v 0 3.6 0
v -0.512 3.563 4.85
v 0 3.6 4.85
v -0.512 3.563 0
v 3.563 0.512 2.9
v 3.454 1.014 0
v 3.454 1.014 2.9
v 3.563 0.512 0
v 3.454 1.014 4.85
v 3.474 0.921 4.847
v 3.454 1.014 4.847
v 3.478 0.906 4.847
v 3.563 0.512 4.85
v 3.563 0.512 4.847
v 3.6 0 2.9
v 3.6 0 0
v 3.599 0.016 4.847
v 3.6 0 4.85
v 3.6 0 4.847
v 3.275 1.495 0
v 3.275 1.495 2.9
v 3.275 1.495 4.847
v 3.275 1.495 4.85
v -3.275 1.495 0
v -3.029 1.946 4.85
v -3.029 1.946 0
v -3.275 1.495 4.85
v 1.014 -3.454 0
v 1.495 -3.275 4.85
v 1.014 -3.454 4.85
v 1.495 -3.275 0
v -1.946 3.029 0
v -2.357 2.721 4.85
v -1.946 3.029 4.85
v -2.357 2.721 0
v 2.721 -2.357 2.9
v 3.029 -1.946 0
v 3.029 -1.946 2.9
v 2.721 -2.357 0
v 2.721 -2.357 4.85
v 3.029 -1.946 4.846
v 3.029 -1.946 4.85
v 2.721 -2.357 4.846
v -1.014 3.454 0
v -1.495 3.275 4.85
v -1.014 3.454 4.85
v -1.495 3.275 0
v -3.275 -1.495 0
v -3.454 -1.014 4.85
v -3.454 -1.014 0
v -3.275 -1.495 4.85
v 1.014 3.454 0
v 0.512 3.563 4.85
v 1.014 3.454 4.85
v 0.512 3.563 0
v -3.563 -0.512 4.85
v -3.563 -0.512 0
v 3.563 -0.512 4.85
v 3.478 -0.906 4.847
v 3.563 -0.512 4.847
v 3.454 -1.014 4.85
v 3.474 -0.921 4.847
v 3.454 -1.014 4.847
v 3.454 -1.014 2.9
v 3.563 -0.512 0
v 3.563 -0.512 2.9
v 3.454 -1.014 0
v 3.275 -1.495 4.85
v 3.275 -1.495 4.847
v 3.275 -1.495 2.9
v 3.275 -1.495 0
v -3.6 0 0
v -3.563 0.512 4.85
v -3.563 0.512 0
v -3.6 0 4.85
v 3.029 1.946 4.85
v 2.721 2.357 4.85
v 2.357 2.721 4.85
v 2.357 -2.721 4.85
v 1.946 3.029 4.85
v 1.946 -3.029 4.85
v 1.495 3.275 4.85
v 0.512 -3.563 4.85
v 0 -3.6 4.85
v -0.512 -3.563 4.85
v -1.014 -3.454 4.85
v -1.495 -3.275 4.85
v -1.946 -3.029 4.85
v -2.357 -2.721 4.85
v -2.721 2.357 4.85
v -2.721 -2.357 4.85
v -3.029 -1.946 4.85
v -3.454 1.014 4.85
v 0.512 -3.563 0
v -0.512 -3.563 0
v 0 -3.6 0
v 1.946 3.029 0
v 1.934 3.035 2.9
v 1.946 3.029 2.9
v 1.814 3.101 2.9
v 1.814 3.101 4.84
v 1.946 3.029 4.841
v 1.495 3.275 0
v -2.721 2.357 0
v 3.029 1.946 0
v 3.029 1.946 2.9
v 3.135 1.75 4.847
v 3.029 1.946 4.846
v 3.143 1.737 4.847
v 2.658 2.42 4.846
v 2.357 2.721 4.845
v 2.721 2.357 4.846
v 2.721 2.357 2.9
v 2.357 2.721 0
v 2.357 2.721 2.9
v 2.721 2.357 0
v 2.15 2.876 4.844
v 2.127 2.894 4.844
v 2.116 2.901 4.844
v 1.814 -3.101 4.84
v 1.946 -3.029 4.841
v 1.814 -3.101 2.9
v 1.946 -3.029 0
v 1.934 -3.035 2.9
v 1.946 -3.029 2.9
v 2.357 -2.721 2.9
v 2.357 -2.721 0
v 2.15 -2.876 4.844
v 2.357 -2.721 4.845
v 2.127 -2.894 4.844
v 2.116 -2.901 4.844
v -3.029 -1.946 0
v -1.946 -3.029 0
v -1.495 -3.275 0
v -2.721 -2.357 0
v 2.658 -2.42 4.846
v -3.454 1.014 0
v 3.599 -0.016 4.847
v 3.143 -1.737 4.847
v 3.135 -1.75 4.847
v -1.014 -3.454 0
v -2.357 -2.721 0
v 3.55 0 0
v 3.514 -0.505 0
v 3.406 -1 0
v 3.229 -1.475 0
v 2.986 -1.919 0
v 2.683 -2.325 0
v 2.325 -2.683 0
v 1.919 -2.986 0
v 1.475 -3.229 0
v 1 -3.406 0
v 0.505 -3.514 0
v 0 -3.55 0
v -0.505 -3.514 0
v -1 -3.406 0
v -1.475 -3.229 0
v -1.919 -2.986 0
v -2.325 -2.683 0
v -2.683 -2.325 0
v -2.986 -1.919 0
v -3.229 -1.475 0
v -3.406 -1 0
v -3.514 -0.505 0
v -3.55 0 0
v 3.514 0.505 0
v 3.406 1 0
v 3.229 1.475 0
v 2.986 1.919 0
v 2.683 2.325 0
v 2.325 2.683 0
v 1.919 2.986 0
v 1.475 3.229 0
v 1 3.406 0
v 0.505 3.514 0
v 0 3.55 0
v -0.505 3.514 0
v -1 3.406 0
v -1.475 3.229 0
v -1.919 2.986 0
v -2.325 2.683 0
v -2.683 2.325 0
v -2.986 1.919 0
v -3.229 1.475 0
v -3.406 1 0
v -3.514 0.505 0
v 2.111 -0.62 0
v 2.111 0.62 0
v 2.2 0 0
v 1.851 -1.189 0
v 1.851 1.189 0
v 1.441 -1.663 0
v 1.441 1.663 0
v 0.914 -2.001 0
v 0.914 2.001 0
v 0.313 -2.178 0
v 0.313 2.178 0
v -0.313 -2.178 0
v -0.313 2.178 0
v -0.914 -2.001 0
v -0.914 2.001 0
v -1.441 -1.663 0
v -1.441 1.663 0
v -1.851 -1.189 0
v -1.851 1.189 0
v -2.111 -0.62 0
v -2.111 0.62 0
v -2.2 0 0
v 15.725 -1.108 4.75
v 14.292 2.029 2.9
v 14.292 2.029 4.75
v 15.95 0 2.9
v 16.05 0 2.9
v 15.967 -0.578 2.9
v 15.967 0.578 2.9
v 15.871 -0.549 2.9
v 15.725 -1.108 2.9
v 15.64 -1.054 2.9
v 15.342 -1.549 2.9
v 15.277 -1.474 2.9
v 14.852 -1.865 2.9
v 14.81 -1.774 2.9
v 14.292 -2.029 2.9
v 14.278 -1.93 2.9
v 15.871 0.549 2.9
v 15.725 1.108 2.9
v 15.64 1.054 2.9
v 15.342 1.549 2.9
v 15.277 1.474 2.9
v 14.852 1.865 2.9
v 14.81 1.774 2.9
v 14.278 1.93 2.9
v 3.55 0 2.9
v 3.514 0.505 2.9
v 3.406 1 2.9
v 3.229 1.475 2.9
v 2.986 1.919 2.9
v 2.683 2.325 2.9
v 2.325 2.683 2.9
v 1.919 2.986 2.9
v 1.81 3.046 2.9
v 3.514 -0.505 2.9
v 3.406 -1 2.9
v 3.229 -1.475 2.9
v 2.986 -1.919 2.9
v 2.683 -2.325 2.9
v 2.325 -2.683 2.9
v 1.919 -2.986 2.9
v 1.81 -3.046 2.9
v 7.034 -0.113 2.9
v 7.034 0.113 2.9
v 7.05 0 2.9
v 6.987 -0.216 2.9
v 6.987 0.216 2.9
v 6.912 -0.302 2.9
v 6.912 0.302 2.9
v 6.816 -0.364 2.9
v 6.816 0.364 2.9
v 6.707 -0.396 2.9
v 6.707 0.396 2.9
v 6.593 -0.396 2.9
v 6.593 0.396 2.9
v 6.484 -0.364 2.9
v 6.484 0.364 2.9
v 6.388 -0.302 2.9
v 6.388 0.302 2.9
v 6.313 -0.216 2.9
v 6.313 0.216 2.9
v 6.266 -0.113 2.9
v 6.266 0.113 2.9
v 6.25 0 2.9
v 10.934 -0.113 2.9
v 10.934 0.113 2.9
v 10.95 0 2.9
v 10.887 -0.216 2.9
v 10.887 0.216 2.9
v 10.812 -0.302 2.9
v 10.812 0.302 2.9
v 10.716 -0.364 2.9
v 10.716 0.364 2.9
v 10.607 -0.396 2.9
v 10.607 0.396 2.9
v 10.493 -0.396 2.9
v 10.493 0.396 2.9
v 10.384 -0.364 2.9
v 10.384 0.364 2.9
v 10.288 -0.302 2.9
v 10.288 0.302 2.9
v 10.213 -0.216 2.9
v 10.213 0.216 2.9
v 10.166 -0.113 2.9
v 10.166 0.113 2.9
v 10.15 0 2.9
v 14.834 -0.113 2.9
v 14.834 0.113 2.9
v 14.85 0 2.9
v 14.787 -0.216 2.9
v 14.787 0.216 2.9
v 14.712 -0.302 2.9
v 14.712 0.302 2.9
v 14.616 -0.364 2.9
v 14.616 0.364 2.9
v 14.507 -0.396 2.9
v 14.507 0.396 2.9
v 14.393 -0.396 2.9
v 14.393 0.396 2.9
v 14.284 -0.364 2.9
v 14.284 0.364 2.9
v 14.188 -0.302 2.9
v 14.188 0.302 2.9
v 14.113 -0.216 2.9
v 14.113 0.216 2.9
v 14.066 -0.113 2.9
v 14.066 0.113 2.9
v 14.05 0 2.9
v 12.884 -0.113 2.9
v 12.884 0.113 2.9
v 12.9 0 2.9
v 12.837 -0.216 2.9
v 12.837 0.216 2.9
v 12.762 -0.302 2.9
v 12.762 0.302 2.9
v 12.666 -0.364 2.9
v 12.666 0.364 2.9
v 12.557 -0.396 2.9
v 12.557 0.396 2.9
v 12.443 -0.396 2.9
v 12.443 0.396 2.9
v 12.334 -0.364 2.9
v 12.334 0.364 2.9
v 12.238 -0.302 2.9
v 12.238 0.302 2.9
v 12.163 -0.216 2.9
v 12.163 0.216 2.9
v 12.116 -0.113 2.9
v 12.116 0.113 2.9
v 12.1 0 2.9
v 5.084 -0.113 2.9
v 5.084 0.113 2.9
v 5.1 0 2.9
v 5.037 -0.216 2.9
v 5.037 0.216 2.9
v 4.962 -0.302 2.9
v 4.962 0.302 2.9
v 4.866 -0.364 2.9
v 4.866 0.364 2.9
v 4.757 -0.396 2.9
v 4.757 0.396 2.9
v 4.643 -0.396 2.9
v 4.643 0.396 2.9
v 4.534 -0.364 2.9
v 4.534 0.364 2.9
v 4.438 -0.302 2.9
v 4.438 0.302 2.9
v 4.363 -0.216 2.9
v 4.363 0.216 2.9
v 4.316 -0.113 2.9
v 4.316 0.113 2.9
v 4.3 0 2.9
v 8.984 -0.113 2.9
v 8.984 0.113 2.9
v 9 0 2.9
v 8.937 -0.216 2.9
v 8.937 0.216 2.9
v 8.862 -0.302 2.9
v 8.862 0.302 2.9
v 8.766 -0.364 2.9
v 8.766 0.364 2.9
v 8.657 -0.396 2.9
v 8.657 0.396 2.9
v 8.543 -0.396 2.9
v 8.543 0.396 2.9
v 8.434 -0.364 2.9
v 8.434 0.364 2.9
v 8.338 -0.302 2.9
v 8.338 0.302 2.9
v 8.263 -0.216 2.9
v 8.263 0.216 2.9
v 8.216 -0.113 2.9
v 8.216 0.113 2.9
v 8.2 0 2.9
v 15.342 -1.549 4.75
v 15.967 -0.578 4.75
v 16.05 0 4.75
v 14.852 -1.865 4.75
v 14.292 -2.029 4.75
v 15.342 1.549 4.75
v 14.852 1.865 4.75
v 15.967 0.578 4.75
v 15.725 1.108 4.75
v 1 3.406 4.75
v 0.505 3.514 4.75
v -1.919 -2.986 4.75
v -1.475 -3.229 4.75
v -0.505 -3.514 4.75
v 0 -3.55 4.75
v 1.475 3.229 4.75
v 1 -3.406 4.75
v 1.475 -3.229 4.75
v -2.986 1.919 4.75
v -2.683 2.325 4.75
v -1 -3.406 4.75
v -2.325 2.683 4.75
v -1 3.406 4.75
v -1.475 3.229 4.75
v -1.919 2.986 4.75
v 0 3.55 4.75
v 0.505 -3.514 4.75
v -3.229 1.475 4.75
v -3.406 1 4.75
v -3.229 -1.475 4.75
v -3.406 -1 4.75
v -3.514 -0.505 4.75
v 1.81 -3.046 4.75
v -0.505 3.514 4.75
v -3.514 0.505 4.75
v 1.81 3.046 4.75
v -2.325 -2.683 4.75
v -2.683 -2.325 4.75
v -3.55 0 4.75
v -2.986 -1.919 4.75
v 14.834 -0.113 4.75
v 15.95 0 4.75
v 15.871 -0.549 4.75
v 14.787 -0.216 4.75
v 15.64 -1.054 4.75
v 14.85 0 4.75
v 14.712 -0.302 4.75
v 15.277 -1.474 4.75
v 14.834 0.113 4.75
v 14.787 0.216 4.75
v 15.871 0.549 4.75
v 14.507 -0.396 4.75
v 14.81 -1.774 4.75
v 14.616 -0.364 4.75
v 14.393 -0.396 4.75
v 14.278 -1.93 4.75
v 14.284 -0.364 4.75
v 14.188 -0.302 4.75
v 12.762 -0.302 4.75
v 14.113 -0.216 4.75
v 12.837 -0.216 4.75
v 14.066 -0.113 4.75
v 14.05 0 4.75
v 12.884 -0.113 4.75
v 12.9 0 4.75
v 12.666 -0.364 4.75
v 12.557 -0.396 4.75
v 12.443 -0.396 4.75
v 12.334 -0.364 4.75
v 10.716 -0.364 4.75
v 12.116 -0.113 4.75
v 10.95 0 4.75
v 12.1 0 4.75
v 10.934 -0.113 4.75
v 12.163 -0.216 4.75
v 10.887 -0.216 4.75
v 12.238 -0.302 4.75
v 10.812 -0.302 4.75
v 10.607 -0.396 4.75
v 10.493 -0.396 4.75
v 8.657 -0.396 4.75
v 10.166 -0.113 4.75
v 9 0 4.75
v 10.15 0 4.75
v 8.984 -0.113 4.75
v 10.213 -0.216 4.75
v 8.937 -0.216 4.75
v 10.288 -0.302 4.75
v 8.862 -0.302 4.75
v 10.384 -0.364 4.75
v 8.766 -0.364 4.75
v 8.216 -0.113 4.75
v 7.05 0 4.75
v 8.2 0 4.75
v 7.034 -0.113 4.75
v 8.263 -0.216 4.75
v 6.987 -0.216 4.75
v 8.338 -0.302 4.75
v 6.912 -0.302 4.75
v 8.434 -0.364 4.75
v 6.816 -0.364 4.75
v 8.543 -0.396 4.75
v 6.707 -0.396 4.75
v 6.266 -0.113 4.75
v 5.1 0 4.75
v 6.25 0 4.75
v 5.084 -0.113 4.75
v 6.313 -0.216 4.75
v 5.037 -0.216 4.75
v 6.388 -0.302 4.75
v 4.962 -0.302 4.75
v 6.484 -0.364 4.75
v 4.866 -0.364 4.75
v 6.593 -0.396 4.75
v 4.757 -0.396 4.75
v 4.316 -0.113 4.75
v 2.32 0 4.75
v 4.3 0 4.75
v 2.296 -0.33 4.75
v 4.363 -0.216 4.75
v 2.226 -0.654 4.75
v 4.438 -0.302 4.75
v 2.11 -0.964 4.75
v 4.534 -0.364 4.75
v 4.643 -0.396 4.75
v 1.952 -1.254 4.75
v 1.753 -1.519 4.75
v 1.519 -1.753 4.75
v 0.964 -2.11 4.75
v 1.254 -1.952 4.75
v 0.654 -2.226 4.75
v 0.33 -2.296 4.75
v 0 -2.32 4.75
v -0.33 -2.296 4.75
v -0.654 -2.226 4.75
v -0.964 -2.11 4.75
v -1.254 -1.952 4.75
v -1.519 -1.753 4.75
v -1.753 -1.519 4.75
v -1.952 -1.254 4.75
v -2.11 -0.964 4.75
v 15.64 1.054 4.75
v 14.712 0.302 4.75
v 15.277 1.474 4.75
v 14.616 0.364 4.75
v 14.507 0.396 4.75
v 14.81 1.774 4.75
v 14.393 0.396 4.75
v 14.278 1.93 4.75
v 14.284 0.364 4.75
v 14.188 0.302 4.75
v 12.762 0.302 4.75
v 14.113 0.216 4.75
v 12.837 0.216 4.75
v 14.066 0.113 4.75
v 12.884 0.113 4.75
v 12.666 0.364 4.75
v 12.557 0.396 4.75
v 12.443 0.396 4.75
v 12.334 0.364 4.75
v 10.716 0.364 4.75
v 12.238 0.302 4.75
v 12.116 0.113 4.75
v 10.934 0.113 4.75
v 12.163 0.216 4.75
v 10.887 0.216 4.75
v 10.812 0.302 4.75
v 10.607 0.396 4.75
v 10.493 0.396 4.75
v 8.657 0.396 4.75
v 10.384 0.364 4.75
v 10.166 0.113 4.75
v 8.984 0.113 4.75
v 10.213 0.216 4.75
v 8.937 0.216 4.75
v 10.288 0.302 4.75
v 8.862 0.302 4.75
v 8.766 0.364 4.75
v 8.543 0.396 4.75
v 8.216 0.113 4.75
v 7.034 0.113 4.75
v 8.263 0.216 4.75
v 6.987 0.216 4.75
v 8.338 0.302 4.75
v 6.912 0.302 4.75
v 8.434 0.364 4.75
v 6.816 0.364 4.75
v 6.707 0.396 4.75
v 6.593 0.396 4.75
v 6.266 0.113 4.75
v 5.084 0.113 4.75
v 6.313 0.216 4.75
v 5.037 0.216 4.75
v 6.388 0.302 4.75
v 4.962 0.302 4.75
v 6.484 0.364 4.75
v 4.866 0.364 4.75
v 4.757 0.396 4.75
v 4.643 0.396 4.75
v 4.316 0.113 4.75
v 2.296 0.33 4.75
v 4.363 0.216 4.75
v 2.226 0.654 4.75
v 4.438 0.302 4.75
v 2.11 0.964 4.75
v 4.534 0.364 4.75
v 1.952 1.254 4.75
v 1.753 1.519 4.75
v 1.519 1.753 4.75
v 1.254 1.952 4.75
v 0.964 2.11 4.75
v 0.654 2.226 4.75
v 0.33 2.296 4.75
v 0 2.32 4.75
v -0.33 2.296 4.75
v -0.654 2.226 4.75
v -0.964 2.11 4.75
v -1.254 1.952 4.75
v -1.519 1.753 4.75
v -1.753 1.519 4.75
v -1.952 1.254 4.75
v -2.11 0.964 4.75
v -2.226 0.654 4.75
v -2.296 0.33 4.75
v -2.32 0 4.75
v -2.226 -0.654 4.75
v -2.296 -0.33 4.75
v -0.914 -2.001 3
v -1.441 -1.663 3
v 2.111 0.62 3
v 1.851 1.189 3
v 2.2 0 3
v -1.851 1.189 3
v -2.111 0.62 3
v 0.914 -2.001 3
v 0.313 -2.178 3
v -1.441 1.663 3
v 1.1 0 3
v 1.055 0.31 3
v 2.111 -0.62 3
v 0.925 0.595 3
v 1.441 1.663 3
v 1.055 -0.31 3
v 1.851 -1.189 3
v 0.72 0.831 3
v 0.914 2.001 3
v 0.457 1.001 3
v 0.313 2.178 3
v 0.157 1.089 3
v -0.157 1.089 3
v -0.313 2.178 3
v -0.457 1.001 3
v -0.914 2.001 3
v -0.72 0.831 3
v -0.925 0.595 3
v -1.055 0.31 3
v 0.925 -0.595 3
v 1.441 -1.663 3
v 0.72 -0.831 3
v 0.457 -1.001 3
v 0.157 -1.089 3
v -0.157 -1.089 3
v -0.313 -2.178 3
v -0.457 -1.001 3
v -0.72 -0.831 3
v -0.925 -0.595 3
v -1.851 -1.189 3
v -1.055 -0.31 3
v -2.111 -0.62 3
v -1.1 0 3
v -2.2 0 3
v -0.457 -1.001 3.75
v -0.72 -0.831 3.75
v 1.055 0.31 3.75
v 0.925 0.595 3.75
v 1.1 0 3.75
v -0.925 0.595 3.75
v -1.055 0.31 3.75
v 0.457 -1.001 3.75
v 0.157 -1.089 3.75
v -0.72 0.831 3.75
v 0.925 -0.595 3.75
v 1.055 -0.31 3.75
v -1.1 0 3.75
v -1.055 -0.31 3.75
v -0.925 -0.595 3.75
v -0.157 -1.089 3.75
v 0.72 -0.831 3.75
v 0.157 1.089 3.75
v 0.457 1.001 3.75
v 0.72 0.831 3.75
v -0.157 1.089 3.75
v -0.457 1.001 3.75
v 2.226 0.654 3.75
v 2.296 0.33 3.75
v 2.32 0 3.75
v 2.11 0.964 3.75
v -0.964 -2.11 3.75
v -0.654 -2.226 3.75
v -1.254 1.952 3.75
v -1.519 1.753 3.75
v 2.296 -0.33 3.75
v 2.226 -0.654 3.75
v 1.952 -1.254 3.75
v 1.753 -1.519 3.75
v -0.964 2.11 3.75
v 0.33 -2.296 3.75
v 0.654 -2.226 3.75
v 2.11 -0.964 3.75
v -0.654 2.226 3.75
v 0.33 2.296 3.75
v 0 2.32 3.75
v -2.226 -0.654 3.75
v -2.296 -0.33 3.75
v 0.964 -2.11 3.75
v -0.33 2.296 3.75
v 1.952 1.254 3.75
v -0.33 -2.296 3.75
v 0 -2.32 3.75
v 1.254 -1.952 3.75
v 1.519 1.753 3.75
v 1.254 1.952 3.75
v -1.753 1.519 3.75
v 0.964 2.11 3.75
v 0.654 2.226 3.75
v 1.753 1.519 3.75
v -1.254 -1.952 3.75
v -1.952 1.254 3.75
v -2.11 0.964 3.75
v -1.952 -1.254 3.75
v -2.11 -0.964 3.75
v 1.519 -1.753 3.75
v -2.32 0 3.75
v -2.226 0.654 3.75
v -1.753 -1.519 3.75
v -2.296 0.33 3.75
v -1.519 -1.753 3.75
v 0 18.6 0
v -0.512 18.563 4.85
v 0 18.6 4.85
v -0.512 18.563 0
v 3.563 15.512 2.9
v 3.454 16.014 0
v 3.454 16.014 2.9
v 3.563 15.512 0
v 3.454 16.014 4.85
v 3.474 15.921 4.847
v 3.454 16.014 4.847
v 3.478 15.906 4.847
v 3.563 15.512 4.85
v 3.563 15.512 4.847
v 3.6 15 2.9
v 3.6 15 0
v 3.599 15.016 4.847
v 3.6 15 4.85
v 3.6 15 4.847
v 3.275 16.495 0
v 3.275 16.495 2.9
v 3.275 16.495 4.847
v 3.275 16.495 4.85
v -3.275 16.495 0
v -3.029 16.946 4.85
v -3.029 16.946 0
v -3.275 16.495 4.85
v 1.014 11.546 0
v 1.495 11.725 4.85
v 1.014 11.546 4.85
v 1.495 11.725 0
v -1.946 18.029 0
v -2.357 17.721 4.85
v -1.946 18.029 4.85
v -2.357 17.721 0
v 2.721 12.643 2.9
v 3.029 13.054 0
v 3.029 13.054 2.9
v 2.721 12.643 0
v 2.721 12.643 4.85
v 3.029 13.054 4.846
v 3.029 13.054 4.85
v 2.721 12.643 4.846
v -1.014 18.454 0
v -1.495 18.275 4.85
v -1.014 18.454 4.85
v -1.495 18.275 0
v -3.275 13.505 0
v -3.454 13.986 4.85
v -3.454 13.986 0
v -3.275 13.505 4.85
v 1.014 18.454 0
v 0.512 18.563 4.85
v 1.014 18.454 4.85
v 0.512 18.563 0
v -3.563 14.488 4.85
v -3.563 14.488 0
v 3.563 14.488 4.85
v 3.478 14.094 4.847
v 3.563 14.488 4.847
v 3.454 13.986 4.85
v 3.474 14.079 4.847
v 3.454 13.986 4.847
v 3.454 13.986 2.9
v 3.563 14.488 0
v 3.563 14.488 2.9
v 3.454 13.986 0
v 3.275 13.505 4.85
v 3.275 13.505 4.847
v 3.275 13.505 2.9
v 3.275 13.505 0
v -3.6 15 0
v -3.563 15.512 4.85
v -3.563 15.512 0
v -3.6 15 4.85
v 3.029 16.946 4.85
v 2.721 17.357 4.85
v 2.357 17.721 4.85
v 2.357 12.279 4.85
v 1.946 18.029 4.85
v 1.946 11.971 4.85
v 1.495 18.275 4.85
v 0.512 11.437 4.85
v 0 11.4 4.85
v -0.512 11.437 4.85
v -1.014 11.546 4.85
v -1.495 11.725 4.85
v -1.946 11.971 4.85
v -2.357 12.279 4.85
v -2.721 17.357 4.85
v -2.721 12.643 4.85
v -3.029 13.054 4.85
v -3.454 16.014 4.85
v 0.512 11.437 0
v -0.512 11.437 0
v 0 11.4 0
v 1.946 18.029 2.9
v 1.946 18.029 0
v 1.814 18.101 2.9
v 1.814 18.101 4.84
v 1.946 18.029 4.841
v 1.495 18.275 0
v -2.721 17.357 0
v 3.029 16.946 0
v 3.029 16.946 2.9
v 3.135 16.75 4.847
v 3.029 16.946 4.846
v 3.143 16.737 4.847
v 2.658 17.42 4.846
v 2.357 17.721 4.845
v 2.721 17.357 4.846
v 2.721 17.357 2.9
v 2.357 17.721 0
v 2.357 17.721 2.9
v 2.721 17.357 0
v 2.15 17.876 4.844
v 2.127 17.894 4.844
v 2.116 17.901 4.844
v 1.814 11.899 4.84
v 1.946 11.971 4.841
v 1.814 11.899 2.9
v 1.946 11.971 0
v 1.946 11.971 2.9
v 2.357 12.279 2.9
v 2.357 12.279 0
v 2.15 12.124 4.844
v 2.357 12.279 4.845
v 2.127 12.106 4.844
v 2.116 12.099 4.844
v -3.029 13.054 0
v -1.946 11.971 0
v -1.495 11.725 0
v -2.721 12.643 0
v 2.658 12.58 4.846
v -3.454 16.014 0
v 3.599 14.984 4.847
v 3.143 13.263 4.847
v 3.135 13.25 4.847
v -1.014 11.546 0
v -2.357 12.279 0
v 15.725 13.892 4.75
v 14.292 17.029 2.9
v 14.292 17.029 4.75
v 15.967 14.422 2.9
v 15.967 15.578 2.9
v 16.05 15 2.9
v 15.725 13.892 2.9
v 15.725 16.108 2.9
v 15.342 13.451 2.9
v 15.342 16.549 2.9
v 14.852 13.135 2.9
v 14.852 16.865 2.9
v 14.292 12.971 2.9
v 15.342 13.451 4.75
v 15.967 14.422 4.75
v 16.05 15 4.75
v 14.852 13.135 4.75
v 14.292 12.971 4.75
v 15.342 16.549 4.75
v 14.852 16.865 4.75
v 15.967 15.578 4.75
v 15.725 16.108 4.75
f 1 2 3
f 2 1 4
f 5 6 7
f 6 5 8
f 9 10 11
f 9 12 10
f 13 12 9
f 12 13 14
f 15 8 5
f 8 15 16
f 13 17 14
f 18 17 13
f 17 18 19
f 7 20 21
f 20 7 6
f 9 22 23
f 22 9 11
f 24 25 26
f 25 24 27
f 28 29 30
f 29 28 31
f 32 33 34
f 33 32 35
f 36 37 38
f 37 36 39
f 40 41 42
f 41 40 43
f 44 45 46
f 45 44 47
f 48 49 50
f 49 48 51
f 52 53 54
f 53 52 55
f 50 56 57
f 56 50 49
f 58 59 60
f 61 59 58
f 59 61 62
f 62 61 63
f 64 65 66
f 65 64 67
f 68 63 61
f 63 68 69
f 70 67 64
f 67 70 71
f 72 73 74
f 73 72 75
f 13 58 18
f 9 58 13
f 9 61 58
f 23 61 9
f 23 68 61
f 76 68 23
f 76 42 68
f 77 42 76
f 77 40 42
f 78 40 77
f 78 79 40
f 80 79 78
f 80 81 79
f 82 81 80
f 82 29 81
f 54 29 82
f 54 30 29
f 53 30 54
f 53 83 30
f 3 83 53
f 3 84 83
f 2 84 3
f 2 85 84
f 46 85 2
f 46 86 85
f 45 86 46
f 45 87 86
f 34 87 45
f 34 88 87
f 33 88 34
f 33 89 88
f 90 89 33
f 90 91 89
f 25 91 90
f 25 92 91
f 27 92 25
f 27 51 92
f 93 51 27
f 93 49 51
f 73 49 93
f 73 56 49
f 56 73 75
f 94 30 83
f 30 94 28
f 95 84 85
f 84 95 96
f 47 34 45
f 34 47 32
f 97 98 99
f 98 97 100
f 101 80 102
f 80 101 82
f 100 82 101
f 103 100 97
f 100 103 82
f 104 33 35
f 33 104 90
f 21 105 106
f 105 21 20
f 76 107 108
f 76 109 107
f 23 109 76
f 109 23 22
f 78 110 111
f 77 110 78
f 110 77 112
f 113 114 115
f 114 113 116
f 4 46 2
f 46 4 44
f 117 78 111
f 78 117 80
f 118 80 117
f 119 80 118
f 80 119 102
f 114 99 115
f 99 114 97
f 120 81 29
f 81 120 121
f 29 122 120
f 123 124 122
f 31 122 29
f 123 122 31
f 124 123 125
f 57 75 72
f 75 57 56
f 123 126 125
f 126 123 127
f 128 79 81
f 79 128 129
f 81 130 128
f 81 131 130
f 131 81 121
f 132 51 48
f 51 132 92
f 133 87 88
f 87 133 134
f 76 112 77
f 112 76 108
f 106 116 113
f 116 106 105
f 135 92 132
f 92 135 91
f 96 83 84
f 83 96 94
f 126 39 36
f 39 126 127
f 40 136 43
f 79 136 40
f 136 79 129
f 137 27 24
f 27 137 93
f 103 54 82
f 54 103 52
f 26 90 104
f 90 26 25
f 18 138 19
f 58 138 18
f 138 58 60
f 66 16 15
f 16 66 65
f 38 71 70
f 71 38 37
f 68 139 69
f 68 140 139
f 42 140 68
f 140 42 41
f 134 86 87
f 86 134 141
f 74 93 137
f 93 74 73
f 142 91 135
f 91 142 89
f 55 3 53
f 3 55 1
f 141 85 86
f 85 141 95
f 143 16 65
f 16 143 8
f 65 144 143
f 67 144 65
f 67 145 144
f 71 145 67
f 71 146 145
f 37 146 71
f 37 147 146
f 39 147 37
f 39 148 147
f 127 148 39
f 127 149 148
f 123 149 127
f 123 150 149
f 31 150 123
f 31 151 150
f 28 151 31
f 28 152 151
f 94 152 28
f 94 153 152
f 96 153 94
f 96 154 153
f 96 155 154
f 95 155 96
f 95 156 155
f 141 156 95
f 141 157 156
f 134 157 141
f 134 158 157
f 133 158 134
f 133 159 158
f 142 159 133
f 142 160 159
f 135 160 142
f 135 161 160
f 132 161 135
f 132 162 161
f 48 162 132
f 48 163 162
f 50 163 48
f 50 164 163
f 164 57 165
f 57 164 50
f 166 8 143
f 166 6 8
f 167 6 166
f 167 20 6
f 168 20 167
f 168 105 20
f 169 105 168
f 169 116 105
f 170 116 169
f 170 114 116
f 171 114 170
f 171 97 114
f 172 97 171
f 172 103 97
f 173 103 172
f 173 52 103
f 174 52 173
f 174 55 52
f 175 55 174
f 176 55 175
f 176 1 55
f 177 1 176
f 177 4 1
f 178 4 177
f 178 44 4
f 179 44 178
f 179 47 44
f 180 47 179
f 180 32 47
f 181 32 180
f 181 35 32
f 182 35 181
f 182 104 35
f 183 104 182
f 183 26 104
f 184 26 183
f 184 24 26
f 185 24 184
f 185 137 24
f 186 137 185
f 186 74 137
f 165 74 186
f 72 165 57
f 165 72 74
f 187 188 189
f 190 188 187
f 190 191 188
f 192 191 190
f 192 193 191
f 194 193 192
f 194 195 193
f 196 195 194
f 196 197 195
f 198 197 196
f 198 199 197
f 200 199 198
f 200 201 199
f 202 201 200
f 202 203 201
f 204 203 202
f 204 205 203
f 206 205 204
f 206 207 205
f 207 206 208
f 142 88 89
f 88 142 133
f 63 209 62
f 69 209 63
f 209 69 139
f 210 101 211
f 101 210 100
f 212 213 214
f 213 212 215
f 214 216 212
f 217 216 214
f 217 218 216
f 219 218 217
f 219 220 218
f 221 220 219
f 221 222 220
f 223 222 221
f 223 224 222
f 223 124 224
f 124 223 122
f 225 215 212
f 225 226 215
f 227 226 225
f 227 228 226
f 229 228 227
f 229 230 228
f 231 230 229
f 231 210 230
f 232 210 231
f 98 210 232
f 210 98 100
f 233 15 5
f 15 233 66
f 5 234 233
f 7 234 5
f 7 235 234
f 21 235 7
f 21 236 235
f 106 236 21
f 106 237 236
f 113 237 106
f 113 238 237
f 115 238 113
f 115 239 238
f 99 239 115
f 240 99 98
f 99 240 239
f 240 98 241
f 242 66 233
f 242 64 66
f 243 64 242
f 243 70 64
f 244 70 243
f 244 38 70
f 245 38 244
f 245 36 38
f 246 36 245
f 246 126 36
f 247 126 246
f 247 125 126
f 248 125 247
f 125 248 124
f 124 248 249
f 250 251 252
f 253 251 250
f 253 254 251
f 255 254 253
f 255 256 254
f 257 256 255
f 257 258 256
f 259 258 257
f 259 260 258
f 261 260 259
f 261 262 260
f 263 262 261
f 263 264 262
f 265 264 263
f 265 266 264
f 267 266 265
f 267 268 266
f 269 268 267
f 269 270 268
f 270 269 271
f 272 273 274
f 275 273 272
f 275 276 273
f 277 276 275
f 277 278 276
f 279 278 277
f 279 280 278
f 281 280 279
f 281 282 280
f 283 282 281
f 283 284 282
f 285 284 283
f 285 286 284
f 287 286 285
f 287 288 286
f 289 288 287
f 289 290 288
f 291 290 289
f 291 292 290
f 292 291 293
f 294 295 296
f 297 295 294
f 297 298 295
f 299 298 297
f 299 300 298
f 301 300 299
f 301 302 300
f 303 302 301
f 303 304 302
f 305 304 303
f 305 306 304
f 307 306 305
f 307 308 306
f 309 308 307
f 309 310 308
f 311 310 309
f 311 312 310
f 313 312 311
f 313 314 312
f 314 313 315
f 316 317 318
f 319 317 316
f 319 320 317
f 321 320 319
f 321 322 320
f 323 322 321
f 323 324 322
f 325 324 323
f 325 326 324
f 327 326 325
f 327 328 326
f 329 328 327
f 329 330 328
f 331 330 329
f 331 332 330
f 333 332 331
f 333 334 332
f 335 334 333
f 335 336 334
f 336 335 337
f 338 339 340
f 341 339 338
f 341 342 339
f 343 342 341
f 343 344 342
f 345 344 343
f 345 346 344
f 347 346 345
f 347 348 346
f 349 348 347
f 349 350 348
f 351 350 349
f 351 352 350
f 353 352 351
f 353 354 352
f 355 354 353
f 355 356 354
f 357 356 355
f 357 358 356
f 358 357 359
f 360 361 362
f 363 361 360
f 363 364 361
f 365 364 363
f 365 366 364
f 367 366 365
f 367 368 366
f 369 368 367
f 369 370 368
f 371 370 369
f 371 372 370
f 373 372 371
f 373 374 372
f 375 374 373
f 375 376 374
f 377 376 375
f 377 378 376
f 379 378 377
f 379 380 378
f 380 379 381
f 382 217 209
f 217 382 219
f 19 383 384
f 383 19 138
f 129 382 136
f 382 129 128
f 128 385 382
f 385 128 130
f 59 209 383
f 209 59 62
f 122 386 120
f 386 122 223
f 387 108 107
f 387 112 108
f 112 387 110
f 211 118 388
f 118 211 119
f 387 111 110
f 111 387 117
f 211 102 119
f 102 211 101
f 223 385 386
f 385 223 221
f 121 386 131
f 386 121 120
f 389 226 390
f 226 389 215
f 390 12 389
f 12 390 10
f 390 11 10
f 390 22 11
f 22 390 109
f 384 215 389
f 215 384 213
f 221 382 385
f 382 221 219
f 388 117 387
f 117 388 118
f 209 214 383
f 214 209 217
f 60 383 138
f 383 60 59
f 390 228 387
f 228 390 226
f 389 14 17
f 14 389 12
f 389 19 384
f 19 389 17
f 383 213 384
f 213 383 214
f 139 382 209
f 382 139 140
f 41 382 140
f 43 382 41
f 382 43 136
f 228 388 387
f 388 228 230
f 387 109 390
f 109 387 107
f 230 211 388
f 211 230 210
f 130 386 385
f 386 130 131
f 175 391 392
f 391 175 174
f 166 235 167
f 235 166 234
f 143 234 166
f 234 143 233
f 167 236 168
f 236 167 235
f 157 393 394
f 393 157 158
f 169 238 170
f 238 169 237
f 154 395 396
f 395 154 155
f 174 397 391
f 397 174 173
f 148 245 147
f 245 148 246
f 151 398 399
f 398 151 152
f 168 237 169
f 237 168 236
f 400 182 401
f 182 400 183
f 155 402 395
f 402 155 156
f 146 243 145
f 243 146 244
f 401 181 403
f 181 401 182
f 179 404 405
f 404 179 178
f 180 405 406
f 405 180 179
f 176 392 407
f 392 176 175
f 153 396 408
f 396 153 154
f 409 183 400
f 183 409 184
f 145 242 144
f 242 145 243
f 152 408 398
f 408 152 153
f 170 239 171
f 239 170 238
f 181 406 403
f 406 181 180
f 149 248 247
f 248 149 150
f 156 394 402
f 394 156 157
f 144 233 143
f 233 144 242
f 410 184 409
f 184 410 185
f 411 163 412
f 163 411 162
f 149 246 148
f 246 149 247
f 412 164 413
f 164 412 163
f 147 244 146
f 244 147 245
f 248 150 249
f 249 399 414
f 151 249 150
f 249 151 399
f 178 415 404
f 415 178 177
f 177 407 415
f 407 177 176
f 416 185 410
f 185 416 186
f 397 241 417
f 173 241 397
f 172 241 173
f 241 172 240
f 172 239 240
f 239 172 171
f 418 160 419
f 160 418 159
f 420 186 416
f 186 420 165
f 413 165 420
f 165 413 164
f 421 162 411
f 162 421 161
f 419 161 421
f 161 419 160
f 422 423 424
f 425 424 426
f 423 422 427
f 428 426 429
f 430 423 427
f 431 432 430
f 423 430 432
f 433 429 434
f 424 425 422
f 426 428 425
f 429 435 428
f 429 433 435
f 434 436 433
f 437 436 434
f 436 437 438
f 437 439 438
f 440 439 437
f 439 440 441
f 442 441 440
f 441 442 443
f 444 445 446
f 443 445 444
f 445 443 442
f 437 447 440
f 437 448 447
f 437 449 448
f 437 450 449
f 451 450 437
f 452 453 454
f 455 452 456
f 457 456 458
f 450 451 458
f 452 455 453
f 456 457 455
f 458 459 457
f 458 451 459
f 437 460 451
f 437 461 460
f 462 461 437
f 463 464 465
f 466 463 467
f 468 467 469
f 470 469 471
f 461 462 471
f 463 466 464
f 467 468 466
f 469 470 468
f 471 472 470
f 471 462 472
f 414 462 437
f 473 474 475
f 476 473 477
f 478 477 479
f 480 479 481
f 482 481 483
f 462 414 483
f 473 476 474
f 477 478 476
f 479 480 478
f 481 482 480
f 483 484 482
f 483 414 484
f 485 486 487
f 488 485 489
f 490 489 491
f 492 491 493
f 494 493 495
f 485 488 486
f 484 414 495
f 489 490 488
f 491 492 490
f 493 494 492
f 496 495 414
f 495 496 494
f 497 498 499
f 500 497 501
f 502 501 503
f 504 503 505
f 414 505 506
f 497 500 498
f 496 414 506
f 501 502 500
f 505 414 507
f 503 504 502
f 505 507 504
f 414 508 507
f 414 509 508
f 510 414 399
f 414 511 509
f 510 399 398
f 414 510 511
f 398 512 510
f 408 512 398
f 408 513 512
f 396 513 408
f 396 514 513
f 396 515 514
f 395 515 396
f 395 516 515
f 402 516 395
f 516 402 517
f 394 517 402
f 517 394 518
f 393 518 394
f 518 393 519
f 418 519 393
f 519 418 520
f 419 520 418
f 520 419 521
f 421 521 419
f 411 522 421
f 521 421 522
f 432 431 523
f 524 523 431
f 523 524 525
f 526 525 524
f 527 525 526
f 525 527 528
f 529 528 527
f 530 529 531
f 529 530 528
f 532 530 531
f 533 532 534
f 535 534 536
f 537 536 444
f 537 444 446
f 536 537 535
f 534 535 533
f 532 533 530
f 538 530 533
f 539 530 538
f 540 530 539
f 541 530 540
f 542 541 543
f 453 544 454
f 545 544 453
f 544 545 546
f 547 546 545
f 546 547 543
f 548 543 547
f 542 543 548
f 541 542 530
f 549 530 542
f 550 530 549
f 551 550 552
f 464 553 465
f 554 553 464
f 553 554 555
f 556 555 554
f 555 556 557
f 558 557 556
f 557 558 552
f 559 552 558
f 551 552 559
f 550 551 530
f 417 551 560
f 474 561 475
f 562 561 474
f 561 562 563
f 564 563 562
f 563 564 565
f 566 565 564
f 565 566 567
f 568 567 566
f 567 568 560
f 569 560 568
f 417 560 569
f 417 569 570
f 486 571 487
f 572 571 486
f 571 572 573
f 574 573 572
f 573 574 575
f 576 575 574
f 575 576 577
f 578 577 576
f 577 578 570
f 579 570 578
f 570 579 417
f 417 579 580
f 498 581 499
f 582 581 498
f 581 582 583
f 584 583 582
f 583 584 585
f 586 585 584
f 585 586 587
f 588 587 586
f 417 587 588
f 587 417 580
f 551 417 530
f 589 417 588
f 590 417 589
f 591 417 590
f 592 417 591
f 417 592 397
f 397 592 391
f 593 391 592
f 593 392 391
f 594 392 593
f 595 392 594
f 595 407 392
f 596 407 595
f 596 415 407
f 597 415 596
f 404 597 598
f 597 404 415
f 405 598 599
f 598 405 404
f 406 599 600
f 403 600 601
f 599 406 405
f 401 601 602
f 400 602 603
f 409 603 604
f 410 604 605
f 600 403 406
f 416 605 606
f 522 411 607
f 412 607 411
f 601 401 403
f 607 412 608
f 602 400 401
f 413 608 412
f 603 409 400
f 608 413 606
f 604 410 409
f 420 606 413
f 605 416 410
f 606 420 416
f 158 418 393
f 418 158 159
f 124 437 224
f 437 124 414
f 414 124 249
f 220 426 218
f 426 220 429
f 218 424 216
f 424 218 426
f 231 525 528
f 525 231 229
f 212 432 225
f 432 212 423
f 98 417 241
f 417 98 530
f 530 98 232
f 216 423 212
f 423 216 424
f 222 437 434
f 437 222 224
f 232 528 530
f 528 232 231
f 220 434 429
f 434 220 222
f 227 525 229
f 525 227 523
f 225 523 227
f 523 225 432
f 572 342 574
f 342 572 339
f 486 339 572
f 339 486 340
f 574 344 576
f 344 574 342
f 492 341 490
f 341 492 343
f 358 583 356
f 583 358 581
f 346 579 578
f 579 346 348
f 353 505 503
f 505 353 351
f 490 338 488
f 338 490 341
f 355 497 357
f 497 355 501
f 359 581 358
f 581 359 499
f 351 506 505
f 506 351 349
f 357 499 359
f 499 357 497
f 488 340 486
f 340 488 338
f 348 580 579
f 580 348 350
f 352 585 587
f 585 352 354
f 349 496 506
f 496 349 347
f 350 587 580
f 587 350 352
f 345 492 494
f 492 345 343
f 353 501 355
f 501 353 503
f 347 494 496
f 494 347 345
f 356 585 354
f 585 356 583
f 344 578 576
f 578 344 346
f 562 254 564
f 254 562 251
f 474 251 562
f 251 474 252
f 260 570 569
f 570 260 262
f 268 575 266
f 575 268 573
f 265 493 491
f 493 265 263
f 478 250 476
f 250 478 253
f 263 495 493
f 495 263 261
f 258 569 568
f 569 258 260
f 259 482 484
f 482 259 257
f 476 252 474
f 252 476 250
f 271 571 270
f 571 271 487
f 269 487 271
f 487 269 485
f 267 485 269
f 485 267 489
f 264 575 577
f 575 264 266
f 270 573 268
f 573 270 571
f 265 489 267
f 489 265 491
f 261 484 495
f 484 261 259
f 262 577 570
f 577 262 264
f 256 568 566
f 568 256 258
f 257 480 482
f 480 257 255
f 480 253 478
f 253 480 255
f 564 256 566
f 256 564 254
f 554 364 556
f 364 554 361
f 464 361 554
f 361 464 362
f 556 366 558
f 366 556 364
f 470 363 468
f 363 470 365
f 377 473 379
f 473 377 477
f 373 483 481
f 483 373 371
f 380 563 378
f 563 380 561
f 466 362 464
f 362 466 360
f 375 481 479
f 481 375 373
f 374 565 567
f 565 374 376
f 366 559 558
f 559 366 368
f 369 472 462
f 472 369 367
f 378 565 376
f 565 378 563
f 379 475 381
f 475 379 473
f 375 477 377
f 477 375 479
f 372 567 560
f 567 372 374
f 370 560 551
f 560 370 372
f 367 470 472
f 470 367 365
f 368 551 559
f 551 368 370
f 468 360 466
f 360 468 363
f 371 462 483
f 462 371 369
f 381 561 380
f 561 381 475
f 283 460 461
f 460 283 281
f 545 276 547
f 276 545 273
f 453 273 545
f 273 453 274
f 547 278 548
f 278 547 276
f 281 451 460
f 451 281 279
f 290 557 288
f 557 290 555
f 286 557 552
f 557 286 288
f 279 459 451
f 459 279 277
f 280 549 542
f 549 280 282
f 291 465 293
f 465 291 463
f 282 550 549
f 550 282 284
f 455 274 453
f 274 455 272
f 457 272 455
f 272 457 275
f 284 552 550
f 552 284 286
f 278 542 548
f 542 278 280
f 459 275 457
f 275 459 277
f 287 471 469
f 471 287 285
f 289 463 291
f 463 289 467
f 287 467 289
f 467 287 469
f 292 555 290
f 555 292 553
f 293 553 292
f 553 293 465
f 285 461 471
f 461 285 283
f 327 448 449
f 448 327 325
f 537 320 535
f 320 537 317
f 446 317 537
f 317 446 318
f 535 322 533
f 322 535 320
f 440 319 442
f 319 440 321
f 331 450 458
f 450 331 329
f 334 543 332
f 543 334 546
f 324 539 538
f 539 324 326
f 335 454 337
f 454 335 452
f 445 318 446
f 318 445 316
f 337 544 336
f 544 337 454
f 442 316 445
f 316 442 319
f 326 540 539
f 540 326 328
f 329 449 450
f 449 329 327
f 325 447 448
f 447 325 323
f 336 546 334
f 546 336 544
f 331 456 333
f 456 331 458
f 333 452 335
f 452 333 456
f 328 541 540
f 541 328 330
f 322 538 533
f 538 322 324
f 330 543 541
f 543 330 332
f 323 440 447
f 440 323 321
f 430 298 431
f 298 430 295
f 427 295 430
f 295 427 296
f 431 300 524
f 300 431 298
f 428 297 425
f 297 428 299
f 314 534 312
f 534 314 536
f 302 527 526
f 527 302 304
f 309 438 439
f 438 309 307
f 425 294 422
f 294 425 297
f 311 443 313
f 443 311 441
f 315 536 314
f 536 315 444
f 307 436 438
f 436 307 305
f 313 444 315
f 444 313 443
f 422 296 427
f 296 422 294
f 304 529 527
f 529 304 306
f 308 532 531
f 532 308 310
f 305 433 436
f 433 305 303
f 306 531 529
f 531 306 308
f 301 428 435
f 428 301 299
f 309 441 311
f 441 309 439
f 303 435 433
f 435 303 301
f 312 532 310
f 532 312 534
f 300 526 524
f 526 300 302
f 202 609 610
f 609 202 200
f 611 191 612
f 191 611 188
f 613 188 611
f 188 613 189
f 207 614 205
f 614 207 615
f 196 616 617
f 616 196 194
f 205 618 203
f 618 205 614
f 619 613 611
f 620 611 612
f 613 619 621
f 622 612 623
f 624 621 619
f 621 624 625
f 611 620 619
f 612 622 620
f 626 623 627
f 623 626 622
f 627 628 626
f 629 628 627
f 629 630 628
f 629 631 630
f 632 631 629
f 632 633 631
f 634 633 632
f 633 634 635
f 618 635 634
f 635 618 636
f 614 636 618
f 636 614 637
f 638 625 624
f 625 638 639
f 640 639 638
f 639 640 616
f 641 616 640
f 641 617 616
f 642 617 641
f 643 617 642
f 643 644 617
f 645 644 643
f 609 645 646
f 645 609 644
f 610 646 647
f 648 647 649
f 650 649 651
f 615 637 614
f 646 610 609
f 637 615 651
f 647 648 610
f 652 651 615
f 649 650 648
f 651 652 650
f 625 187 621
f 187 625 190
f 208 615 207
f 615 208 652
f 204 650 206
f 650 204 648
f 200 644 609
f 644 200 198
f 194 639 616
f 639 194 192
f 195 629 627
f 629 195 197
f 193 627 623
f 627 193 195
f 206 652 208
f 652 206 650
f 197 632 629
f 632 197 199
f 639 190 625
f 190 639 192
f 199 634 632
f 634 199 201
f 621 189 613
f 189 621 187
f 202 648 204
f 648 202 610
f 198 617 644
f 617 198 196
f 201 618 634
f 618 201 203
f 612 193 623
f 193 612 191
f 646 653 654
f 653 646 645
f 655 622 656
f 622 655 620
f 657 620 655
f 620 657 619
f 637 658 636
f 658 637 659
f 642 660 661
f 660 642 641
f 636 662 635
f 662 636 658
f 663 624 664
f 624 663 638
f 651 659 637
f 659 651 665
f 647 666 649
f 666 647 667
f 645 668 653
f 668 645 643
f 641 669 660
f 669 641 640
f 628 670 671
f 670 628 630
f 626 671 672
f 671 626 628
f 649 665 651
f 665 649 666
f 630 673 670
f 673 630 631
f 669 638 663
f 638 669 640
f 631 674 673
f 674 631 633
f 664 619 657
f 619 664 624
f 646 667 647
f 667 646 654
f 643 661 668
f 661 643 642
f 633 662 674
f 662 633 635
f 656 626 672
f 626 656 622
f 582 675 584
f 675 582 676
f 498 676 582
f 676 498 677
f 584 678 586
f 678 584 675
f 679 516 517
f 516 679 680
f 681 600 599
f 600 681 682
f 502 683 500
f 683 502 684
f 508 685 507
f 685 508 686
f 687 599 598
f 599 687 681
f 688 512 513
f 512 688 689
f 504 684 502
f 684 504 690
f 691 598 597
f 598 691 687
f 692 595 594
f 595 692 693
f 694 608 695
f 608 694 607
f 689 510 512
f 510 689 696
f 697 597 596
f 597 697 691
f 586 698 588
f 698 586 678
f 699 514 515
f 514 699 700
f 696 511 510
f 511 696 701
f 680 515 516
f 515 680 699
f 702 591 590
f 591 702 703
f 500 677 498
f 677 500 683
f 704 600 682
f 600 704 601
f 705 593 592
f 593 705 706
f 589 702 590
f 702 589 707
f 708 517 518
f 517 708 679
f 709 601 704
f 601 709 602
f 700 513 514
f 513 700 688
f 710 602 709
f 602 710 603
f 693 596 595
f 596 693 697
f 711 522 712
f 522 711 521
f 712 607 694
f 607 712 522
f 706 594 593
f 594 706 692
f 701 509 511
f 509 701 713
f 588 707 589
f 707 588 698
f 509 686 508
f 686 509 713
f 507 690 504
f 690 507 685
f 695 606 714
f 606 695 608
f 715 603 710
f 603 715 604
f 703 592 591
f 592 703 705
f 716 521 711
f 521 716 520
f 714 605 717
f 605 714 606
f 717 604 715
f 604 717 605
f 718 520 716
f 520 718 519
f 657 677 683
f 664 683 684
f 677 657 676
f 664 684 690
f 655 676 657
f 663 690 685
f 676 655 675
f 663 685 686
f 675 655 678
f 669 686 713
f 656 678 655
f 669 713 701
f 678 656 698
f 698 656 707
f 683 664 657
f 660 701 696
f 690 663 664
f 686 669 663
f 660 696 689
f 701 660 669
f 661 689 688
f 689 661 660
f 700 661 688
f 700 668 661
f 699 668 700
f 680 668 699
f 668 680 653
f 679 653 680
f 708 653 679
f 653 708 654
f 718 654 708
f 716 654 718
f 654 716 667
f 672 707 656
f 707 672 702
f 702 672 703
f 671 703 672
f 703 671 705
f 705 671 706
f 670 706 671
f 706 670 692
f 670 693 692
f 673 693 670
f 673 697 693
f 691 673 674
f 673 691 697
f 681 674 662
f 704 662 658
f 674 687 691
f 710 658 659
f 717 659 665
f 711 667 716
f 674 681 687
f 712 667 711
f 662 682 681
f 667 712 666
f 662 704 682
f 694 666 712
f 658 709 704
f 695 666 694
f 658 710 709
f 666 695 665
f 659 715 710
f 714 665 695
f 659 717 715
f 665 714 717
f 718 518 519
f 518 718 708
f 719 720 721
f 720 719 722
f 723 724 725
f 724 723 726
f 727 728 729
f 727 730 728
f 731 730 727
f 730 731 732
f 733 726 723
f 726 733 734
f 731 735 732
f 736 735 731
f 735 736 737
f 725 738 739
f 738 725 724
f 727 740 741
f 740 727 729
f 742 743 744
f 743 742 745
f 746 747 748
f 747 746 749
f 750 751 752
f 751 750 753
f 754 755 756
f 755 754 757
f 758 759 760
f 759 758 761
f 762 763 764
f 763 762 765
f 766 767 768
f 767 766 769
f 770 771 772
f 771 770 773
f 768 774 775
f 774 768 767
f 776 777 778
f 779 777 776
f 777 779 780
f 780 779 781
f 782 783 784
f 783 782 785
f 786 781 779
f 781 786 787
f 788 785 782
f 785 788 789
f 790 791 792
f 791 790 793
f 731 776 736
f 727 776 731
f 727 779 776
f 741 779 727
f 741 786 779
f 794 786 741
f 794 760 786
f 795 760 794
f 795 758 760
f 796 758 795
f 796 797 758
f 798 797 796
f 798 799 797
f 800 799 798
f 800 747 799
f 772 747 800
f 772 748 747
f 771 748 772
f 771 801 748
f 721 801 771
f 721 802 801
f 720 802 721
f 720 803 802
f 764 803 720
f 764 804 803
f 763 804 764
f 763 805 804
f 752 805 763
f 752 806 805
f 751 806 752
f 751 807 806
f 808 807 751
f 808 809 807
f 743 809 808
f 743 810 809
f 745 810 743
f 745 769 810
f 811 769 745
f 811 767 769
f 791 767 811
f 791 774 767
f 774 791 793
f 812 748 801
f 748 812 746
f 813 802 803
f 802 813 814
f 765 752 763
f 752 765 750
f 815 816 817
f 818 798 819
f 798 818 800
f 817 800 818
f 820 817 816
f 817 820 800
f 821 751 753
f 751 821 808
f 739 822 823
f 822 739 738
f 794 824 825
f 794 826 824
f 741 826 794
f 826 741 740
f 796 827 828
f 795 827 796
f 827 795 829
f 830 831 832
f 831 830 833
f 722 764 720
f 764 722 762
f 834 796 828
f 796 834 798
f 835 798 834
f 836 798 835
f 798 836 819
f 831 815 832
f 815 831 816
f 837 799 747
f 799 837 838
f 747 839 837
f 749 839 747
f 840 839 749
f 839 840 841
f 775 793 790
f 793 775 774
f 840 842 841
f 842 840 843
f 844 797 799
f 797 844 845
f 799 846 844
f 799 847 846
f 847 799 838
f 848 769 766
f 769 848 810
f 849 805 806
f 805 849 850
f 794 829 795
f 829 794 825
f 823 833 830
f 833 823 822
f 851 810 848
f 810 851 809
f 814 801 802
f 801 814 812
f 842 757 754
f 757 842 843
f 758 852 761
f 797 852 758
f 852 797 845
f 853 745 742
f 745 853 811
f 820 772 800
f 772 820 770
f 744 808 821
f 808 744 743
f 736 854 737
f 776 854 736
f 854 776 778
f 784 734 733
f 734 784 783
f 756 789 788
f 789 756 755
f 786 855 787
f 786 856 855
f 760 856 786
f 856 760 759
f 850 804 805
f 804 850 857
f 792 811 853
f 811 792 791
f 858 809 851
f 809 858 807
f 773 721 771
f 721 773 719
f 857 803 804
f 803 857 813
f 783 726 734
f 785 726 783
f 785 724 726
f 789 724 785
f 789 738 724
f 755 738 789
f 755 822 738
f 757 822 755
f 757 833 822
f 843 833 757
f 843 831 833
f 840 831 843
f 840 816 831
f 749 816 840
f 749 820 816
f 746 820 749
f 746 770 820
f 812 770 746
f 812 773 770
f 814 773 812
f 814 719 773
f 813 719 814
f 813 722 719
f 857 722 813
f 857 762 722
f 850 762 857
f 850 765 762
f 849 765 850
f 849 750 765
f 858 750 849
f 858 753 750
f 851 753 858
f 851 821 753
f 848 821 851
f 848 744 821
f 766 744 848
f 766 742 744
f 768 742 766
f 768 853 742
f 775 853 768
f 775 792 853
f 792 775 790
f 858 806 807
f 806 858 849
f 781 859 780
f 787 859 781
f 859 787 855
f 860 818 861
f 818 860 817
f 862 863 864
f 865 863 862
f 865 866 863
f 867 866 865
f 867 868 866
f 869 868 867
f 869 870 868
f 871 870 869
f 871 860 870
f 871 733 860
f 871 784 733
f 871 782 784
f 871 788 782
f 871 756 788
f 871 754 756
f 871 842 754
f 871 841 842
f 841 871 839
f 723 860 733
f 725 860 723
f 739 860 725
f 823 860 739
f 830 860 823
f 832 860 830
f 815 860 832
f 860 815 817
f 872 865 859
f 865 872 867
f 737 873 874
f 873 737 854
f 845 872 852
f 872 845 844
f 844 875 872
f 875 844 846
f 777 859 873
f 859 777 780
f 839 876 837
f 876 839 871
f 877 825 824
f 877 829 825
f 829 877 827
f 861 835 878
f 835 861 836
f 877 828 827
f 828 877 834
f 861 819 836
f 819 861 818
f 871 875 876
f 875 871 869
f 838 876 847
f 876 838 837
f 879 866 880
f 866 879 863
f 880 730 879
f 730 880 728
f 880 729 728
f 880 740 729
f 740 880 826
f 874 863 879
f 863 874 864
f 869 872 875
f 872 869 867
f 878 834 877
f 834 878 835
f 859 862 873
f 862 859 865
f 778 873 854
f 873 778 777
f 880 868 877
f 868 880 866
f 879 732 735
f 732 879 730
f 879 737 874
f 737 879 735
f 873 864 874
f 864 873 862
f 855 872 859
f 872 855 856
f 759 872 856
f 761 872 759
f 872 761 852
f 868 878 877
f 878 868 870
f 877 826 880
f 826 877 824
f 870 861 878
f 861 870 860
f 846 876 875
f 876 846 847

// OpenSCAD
// armSingle for sg92r micro servo

//------------------------------------------
// arm1
module arm1(){
difference(){
    union(){
        // Boss
        cylinder(r=3.55,h=4.75,$fn=44);
        // arm
        hull(){
            translate([0,0,4.75-1.85])
            cylinder(r=3.2,h=1.85,$fn=22);

            translate([14,0,4.75-1.85])
            cylinder(r=3.9/2,h=1.85,$fn=22);
        }
    }

    // bottom cut
    cylinder(r=2.2,h=3.0,$fn=22);
    // thru cut
    cylinder(r=1.1,h=5,$fn=22);
    // top cut
    translate([0,0,4.75-1.0])
    cylinder(r=2.32,h=1,$fn=44);
    
    // holes in the arm
    for(i=[0:5])
    translate([4.7+i*9.75/5,0,4.75-1.85])
    cylinder(r=0.4,h=2,$fn=22);
}
} // ---------- end module arm1 -------

// arm1cut
module arm1cut(tol=0.1){
difference(){
    union(){
        // Boss
        cylinder(r=3.55+tol/2,h=4.75+tol,$fn=44);
        // arm
        hull(){
            translate([0,0,4.75-1.85])
            cylinder(r=3.2+tol/2,h=1.85+tol,$fn=22);

            translate([14,0,4.75-1.85])
            cylinder(r=3.9/2+tol,h=1.85,$fn=22);
        }
    }

    // bottom cut if needed
//    cylinder(r=2.2-tol/2,h=3.0-tol,$fn=22);
}
} // ---------- end module arm1cut -------

difference(){
arm1cut();
arm1();
}

translate([0,15,0])
arm1cut();
